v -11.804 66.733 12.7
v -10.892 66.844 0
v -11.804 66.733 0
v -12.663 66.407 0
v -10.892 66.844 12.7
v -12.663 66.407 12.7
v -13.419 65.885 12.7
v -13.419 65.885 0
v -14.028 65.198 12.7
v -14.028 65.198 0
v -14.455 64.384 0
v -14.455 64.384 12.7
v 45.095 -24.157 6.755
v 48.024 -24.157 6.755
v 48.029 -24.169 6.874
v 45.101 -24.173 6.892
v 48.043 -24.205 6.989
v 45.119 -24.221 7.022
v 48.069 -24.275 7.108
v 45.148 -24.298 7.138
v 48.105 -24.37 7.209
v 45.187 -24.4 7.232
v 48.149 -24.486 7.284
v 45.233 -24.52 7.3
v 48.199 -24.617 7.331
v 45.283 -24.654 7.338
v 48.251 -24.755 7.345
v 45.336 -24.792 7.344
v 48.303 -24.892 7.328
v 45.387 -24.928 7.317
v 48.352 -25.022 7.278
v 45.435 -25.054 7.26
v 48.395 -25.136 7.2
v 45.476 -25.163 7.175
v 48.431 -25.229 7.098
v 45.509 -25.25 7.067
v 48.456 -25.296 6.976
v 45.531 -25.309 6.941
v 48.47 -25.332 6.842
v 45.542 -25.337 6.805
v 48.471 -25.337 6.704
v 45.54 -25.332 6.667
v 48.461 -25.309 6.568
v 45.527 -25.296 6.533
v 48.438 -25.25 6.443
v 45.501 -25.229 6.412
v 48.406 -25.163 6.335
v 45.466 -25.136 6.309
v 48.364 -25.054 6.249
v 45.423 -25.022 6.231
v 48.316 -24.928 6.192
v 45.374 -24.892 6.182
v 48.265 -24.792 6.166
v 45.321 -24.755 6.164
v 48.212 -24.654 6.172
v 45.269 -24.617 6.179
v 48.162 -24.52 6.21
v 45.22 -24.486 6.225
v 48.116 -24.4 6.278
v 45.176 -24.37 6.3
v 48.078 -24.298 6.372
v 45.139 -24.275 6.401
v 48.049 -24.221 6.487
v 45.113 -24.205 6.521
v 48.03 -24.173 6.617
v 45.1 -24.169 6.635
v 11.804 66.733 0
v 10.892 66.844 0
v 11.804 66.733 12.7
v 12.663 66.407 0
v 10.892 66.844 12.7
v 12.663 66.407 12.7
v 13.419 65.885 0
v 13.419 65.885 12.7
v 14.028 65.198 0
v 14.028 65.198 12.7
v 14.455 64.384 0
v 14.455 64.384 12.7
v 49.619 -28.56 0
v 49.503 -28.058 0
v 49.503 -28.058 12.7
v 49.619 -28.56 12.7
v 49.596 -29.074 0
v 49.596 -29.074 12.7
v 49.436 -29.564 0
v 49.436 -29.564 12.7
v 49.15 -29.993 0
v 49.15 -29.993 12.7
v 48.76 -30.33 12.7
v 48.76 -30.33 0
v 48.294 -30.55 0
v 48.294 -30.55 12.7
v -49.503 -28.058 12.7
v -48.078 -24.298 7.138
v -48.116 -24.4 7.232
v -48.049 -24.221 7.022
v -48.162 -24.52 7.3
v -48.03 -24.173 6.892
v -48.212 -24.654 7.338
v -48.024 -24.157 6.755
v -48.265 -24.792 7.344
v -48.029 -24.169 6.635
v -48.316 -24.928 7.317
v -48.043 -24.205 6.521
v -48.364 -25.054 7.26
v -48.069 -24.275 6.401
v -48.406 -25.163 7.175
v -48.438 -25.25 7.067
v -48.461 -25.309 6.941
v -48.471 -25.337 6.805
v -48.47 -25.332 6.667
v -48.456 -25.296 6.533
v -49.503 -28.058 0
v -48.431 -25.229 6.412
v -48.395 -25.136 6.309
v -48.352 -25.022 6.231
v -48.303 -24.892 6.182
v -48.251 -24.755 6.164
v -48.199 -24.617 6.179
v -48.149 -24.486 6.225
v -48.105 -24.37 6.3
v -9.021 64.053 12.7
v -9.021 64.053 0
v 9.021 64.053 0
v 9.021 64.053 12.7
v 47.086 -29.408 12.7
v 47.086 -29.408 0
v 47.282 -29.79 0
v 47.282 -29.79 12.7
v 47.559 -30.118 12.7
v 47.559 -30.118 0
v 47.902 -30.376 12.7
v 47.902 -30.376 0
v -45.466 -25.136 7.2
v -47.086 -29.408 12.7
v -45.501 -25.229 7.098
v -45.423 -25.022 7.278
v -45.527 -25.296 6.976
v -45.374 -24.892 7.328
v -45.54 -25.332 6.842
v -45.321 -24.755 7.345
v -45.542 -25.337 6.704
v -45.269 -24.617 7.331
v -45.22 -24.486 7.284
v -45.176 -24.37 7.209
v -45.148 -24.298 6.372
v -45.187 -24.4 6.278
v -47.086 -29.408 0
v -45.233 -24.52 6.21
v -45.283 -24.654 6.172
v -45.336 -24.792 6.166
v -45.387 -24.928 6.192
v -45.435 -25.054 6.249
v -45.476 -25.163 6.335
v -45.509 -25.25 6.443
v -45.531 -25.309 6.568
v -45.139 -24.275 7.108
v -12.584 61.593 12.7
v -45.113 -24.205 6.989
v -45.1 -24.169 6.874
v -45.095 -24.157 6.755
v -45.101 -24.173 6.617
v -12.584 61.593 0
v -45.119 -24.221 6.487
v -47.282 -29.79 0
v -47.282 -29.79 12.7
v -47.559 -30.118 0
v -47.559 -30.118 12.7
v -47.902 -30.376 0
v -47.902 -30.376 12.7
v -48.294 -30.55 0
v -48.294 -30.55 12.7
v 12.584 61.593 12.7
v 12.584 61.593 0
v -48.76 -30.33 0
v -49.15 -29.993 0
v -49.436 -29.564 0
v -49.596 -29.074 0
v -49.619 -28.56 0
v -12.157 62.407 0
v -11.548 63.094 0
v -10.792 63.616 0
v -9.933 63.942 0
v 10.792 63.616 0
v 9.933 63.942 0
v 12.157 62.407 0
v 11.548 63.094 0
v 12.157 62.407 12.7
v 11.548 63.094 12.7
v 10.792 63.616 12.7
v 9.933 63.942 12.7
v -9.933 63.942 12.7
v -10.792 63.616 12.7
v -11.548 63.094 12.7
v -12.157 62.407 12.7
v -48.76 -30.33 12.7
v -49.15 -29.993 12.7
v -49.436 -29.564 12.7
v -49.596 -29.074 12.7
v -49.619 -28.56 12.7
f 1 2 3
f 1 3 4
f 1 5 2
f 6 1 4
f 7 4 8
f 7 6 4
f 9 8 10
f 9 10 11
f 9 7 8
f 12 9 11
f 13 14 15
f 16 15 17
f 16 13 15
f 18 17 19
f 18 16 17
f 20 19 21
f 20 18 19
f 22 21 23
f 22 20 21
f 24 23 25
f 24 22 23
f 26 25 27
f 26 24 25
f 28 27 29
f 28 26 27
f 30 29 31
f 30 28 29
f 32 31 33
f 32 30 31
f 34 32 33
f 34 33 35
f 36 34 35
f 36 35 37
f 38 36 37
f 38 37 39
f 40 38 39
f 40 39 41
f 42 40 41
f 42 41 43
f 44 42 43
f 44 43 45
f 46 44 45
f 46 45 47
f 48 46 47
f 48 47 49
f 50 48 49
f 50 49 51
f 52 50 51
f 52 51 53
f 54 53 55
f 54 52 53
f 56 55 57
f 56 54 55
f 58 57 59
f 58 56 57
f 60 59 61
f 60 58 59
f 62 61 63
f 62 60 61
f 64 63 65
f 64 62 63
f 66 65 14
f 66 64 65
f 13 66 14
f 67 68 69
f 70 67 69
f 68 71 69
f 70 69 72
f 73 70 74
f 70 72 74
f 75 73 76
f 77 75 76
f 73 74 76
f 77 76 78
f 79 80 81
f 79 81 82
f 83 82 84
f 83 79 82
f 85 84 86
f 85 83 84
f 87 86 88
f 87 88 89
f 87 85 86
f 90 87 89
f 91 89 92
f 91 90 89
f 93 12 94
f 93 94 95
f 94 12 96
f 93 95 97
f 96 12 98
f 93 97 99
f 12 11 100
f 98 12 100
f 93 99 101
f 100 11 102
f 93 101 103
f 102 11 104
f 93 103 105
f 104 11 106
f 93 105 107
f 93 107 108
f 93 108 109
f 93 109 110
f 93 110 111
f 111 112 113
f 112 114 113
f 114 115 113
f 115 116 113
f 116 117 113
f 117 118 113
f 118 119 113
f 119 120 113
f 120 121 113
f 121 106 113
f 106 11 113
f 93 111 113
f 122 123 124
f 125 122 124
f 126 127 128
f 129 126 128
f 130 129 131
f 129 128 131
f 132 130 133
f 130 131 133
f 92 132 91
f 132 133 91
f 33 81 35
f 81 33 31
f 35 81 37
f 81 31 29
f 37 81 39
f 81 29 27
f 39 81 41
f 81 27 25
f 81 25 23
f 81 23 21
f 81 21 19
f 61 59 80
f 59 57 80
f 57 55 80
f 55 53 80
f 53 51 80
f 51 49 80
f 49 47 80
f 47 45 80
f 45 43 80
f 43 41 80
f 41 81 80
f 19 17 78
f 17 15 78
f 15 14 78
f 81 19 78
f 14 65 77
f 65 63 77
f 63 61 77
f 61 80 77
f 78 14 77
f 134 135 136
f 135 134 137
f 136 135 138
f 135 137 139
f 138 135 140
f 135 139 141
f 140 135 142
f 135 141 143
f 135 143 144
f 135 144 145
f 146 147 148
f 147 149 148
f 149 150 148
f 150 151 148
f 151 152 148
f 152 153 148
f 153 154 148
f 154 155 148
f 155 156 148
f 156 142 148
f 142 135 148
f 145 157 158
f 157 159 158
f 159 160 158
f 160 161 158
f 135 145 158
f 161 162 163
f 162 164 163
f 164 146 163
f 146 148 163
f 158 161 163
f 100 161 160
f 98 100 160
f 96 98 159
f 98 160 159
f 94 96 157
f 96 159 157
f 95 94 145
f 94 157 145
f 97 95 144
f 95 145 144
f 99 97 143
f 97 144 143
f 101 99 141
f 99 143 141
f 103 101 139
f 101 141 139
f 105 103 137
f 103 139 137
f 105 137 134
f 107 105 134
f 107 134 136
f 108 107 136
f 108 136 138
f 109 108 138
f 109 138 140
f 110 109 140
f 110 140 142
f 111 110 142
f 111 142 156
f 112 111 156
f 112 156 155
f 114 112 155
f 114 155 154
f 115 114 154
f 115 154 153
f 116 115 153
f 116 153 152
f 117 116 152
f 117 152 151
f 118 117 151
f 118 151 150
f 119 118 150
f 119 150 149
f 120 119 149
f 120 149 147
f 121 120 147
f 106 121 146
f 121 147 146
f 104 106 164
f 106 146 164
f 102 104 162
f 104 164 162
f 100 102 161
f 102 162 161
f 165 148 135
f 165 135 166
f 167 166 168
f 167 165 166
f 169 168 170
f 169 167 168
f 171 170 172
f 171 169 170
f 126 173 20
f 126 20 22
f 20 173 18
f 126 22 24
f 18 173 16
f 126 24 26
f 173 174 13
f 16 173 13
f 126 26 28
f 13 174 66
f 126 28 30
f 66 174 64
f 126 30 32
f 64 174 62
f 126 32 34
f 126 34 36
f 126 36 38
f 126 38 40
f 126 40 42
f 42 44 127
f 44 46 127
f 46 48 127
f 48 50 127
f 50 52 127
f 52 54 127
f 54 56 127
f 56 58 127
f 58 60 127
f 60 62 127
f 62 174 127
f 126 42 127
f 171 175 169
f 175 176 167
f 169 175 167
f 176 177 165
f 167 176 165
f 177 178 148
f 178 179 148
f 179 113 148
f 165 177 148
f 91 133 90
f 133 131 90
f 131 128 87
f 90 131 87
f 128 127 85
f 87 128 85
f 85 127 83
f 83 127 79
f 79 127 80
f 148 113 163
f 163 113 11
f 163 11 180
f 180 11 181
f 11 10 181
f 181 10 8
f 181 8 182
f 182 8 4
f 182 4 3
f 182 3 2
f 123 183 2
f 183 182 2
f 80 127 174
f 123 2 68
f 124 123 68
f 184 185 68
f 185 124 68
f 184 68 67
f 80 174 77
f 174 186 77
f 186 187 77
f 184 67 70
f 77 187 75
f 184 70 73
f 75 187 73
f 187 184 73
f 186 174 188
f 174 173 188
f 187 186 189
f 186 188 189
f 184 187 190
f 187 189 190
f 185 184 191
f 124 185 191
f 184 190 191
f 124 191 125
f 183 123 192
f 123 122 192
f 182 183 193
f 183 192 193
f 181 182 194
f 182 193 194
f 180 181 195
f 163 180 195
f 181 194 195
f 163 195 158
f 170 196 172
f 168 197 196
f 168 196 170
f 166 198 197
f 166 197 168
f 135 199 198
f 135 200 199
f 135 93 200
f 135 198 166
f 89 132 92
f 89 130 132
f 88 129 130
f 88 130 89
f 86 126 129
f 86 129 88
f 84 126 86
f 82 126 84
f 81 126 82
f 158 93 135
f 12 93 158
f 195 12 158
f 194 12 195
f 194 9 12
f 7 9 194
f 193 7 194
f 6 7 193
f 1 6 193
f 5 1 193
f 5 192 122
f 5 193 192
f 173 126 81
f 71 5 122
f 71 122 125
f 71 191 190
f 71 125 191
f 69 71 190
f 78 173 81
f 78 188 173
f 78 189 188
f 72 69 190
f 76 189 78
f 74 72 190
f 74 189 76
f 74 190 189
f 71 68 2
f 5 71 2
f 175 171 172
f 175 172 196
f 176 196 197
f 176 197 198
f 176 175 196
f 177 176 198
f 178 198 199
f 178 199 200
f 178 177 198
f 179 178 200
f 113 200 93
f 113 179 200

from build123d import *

# Parameters (mm, degrees)
F1_DEPTH      = 12.7
F2_T1_DEPTH   = 19.2753145827
F2_T3_DEPTH   = 26.4979139795
F3_R          = 3.81
F4_R          = 0.5908054237
F5_DEPTH      = 57.15
F5_DEPTH_BACK = 73.914


# Not quite as in the source:
# - a fillet or chamfer that OpenCascade refuses, or shapes differently, is made with other operations: its cross-section is extruded or revolved along the edge and cut away or added


with BuildPart() as f1:
    # F0 (on Top) → F1 (new body)
    with BuildSketch(Plane.XY):
        Polygon((13.5222204362, 66.8438002467), (0, 66.8438002467), (-13.5222204362, 66.8438002467), (-50.4813892832, -30.6380242109), (-47.5520528853, -30.6380242109), (-11.6511627941, 64.052532285), (0, 64.052532285), (11.6511627941, 64.052532285), (47.5520528853, -30.6380242109), (50.4813892832, -30.6380242109), align=None)
    extrude(amount=F1_DEPTH)

    # F2: fillet of radius 1.905 on 4 edges, made by hand

    # F2_s2 → F2_t1 (cut)
    with BuildSketch(Plane.XY.offset(-3.2876572913)):
        with BuildLine():
            ThreePointArc((-47.0858443706, -29.4083738154), (-47.784876456, -30.3007560114), (-48.8671158018, -30.6380242109))
            Line((-48.8671158018, -30.6380242109), (-47.5520528853, -30.6380242109))
            Line((-47.5520528853, -30.6380242109), (-47.0858443706, -29.4083738154))
        make_face()
        with BuildLine():
            ThreePointArc((47.0858443706, -29.4083738154), (47.784876456, -30.3007560114), (48.8671158018, -30.6380242109))
            Line((48.8671158018, -30.6380242109), (47.5520528853, -30.6380242109))
            Line((47.5520528853, -30.6380242109), (47.0858443706, -29.4083738154))
        make_face()
    extrude(amount=F2_T1_DEPTH, mode=Mode.SUBTRACT)

    # F2_s4 → F2_t3 (cut)
    with BuildSketch(Plane.XY.offset(-6.8989569898)):
        with BuildLine():
            ThreePointArc((-47.7218064873, -30.6380242109), (-49.2895382878, -29.8152635568), (-49.5030779186, -28.0576746065))
            Line((-49.5030779186, -28.0576746065), (-50.4813892832, -30.6380242109))
            Line((-50.4813892832, -30.6380242109), (-47.7218064873, -30.6380242109))
        make_face()
        with BuildLine():
            ThreePointArc((49.5030779186, -28.0576746065), (49.2895382878, -29.8152635568), (47.7218064873, -30.6380242109))
            Line((47.7218064873, -30.6380242109), (50.4813892832, -30.6380242109))
            Line((50.4813892832, -30.6380242109), (49.5030779186, -28.0576746065))
        make_face()
    extrude(amount=F2_T3_DEPTH, mode=Mode.SUBTRACT)

    # F3
    f3_edges = [f1.edges().sort_by_distance(p)[0] for p in [
        (13.52222, 66.8438, 6.35),
        (-13.52222, 66.8438, 6.35),
        (-11.651163, 64.052532, 6.35),
        (11.651163, 64.052532, 6.35),
    ]]
    fillet(f3_edges, radius=F3_R)

    # F4 (on Right) → F5 (cut, two sides)
    with BuildSketch(Plane.YZ) as f5_sk:
        with Locations((-24.7479453683, 6.7547173239)):
            Circle(F4_R)
    extrude(amount=-F5_DEPTH, mode=Mode.SUBTRACT)
    extrude(f5_sk.sketch, amount=F5_DEPTH_BACK, mode=Mode.SUBTRACT)


solid = f1.part
